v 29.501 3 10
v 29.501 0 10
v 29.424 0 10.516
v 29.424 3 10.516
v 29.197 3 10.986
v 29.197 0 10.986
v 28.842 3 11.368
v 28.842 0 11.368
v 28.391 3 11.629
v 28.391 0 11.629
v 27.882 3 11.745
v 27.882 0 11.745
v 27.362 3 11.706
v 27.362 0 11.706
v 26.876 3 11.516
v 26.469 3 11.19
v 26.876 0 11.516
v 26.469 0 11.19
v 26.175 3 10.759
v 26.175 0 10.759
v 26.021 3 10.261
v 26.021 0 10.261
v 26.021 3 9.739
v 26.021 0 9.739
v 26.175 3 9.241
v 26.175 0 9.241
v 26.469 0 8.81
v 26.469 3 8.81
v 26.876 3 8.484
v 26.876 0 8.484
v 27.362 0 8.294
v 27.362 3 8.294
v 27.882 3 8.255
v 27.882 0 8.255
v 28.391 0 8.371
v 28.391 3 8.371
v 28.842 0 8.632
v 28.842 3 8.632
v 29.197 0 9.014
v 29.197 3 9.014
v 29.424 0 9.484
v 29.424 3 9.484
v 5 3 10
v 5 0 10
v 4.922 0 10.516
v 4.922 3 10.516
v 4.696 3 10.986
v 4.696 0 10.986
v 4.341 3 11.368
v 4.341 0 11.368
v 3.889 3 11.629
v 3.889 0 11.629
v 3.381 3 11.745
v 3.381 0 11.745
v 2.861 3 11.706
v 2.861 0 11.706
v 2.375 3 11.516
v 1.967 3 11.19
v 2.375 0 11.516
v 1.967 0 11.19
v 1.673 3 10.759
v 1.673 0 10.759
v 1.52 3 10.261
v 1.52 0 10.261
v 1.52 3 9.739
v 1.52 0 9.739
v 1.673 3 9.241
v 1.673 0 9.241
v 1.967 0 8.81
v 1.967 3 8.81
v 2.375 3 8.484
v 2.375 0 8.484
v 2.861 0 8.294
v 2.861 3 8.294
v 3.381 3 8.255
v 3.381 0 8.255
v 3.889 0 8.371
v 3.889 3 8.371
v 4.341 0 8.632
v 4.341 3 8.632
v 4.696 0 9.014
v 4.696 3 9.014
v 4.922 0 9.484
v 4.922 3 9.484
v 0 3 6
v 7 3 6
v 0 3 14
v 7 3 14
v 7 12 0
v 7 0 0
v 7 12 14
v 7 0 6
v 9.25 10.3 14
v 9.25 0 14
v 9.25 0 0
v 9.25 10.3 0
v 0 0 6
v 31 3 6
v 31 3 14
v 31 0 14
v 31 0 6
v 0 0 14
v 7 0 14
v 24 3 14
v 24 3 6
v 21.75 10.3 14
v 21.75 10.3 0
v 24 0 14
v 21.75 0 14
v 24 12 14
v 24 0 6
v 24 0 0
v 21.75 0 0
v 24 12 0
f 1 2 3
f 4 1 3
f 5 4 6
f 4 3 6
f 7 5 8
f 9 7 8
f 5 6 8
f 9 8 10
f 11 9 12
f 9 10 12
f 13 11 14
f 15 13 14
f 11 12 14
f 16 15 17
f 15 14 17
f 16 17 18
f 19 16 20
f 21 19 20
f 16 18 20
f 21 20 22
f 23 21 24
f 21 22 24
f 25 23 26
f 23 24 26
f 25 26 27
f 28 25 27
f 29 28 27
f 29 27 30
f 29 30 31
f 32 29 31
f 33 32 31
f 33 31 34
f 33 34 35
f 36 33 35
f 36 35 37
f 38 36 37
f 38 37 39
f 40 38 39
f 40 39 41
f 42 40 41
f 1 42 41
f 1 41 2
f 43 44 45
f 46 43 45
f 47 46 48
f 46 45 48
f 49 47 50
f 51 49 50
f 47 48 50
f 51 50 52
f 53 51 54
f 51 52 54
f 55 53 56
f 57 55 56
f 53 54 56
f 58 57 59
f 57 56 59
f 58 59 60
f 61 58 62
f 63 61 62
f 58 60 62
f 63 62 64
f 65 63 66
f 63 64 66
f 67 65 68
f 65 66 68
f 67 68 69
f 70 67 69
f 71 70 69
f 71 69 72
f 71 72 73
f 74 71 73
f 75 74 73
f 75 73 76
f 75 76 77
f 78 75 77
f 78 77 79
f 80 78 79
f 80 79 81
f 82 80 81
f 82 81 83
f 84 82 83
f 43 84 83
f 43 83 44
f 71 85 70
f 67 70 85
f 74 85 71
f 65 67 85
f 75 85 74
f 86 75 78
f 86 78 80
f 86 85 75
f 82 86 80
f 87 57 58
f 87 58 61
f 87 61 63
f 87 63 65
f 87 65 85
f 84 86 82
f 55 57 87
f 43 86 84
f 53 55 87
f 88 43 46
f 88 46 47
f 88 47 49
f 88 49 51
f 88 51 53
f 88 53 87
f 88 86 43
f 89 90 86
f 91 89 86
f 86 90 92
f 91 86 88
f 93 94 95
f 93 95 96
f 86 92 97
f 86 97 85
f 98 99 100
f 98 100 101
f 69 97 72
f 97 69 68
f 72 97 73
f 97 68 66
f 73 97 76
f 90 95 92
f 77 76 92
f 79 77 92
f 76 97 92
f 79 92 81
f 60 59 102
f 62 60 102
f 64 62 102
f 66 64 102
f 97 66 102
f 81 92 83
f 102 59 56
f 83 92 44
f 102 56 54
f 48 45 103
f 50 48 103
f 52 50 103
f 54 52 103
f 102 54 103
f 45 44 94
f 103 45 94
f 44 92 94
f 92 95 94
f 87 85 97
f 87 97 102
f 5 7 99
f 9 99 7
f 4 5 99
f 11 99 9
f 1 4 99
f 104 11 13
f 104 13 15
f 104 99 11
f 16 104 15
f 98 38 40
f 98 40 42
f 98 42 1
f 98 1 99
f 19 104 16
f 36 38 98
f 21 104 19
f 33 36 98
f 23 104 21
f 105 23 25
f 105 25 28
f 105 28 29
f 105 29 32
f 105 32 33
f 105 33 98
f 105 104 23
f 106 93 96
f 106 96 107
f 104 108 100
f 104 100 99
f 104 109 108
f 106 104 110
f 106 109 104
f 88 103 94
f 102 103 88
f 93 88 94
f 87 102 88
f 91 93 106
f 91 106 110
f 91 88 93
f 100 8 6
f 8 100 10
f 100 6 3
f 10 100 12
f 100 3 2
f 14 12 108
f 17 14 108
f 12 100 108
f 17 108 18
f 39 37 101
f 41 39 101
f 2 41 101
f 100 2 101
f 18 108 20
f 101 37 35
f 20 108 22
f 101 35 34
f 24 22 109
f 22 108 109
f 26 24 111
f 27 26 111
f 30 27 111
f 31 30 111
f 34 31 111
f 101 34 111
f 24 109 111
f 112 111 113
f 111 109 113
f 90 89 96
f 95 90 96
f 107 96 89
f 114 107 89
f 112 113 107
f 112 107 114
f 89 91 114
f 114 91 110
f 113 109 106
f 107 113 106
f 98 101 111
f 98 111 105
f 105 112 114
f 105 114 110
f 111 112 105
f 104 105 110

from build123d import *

# Parameters (mm, degrees)
ESBO_O1_W                = 17.000001856
ESBO_O1_H                = 13.999999967
RESSALTO_EXTRUS_O1_DEPTH = 12.000000396
ESBO_O2_W                = 12.500001117
ESBO_O2_H                = 10.30000049
CORTE_EXTRUS_O1_DEPTH    = 14.999999966
ESBO_O3_W                = 7.999999915
ESBO_O3_H                = 3.000000085
RESSALTO_EXTRUS_O2_DEPTH = 6.999999285
ESBO_O4_R                = 1.75
CORTE_EXTRUS_O2_DEPTH    = 13.000000396
ESBO_O5_W                = 7.999999915
ESBO_O5_H                = 3.000000085
RESSALTO_EXTRUS_O3_DEPTH = 6.999999285
ESBO_O6_R                = 1.75
CORTE_EXTRUS_O3_DEPTH    = 13.000000396


with BuildPart() as part:
    # Esboço1 → Ressalto-extrusão1 (new body)
    with BuildSketch(Plane.XZ.offset(-5e-05)):
        with Locations((15.500025358, 7.000024663)):
            Rectangle(ESBO_O1_W, ESBO_O1_H)
    extrude(amount=-RESSALTO_EXTRUS_O1_DEPTH)

    # Esboço2 → Corte-extrusão1 (cut, through all)
    with BuildSketch(Plane.XY.offset(14.000024647)):
        with Locations((15.500024893, 5.150050245)):
            Rectangle(ESBO_O2_W, ESBO_O2_H)
    extrude(amount=-CORTE_EXTRUS_O1_DEPTH, mode=Mode.SUBTRACT)

    # Esboço3 → Ressalto-extrusão2 (add)
    with BuildSketch(Plane.ZY.offset(-7.00002443)):
        with Locations((10.00002469, 1.500050043)):
            Rectangle(ESBO_O3_W, ESBO_O3_H)
    extrude(amount=RESSALTO_EXTRUS_O2_DEPTH)

    # Esboço4 → Corte-extrusão2 (cut, through all)
    with BuildSketch(Plane.XZ.offset(-5e-05)):
        with Locations((3.250025213, 10.000025168)):
            Circle(ESBO_O4_R)
    extrude(amount=-CORTE_EXTRUS_O2_DEPTH, mode=Mode.SUBTRACT)

    # Esboço5 → Ressalto-extrusão3 (add)
    with BuildSketch(Plane(origin=(24.000026286, 0, 0), x_dir=(0, 0, -1), z_dir=(1, 0, 0))):
        with Locations((-10.00002469, 1.500050043)):
            Rectangle(ESBO_O5_W, ESBO_O5_H)
    extrude(amount=RESSALTO_EXTRUS_O3_DEPTH)

    # Esboço6 → Corte-extrusão3 (cut, through all)
    with BuildSketch(Plane.XZ.offset(-5e-05)):
        with Locations((27.751375675, 10.000025168)):
            Circle(ESBO_O6_R)
    extrude(amount=-CORTE_EXTRUS_O3_DEPTH, mode=Mode.SUBTRACT)


solid = part.part
